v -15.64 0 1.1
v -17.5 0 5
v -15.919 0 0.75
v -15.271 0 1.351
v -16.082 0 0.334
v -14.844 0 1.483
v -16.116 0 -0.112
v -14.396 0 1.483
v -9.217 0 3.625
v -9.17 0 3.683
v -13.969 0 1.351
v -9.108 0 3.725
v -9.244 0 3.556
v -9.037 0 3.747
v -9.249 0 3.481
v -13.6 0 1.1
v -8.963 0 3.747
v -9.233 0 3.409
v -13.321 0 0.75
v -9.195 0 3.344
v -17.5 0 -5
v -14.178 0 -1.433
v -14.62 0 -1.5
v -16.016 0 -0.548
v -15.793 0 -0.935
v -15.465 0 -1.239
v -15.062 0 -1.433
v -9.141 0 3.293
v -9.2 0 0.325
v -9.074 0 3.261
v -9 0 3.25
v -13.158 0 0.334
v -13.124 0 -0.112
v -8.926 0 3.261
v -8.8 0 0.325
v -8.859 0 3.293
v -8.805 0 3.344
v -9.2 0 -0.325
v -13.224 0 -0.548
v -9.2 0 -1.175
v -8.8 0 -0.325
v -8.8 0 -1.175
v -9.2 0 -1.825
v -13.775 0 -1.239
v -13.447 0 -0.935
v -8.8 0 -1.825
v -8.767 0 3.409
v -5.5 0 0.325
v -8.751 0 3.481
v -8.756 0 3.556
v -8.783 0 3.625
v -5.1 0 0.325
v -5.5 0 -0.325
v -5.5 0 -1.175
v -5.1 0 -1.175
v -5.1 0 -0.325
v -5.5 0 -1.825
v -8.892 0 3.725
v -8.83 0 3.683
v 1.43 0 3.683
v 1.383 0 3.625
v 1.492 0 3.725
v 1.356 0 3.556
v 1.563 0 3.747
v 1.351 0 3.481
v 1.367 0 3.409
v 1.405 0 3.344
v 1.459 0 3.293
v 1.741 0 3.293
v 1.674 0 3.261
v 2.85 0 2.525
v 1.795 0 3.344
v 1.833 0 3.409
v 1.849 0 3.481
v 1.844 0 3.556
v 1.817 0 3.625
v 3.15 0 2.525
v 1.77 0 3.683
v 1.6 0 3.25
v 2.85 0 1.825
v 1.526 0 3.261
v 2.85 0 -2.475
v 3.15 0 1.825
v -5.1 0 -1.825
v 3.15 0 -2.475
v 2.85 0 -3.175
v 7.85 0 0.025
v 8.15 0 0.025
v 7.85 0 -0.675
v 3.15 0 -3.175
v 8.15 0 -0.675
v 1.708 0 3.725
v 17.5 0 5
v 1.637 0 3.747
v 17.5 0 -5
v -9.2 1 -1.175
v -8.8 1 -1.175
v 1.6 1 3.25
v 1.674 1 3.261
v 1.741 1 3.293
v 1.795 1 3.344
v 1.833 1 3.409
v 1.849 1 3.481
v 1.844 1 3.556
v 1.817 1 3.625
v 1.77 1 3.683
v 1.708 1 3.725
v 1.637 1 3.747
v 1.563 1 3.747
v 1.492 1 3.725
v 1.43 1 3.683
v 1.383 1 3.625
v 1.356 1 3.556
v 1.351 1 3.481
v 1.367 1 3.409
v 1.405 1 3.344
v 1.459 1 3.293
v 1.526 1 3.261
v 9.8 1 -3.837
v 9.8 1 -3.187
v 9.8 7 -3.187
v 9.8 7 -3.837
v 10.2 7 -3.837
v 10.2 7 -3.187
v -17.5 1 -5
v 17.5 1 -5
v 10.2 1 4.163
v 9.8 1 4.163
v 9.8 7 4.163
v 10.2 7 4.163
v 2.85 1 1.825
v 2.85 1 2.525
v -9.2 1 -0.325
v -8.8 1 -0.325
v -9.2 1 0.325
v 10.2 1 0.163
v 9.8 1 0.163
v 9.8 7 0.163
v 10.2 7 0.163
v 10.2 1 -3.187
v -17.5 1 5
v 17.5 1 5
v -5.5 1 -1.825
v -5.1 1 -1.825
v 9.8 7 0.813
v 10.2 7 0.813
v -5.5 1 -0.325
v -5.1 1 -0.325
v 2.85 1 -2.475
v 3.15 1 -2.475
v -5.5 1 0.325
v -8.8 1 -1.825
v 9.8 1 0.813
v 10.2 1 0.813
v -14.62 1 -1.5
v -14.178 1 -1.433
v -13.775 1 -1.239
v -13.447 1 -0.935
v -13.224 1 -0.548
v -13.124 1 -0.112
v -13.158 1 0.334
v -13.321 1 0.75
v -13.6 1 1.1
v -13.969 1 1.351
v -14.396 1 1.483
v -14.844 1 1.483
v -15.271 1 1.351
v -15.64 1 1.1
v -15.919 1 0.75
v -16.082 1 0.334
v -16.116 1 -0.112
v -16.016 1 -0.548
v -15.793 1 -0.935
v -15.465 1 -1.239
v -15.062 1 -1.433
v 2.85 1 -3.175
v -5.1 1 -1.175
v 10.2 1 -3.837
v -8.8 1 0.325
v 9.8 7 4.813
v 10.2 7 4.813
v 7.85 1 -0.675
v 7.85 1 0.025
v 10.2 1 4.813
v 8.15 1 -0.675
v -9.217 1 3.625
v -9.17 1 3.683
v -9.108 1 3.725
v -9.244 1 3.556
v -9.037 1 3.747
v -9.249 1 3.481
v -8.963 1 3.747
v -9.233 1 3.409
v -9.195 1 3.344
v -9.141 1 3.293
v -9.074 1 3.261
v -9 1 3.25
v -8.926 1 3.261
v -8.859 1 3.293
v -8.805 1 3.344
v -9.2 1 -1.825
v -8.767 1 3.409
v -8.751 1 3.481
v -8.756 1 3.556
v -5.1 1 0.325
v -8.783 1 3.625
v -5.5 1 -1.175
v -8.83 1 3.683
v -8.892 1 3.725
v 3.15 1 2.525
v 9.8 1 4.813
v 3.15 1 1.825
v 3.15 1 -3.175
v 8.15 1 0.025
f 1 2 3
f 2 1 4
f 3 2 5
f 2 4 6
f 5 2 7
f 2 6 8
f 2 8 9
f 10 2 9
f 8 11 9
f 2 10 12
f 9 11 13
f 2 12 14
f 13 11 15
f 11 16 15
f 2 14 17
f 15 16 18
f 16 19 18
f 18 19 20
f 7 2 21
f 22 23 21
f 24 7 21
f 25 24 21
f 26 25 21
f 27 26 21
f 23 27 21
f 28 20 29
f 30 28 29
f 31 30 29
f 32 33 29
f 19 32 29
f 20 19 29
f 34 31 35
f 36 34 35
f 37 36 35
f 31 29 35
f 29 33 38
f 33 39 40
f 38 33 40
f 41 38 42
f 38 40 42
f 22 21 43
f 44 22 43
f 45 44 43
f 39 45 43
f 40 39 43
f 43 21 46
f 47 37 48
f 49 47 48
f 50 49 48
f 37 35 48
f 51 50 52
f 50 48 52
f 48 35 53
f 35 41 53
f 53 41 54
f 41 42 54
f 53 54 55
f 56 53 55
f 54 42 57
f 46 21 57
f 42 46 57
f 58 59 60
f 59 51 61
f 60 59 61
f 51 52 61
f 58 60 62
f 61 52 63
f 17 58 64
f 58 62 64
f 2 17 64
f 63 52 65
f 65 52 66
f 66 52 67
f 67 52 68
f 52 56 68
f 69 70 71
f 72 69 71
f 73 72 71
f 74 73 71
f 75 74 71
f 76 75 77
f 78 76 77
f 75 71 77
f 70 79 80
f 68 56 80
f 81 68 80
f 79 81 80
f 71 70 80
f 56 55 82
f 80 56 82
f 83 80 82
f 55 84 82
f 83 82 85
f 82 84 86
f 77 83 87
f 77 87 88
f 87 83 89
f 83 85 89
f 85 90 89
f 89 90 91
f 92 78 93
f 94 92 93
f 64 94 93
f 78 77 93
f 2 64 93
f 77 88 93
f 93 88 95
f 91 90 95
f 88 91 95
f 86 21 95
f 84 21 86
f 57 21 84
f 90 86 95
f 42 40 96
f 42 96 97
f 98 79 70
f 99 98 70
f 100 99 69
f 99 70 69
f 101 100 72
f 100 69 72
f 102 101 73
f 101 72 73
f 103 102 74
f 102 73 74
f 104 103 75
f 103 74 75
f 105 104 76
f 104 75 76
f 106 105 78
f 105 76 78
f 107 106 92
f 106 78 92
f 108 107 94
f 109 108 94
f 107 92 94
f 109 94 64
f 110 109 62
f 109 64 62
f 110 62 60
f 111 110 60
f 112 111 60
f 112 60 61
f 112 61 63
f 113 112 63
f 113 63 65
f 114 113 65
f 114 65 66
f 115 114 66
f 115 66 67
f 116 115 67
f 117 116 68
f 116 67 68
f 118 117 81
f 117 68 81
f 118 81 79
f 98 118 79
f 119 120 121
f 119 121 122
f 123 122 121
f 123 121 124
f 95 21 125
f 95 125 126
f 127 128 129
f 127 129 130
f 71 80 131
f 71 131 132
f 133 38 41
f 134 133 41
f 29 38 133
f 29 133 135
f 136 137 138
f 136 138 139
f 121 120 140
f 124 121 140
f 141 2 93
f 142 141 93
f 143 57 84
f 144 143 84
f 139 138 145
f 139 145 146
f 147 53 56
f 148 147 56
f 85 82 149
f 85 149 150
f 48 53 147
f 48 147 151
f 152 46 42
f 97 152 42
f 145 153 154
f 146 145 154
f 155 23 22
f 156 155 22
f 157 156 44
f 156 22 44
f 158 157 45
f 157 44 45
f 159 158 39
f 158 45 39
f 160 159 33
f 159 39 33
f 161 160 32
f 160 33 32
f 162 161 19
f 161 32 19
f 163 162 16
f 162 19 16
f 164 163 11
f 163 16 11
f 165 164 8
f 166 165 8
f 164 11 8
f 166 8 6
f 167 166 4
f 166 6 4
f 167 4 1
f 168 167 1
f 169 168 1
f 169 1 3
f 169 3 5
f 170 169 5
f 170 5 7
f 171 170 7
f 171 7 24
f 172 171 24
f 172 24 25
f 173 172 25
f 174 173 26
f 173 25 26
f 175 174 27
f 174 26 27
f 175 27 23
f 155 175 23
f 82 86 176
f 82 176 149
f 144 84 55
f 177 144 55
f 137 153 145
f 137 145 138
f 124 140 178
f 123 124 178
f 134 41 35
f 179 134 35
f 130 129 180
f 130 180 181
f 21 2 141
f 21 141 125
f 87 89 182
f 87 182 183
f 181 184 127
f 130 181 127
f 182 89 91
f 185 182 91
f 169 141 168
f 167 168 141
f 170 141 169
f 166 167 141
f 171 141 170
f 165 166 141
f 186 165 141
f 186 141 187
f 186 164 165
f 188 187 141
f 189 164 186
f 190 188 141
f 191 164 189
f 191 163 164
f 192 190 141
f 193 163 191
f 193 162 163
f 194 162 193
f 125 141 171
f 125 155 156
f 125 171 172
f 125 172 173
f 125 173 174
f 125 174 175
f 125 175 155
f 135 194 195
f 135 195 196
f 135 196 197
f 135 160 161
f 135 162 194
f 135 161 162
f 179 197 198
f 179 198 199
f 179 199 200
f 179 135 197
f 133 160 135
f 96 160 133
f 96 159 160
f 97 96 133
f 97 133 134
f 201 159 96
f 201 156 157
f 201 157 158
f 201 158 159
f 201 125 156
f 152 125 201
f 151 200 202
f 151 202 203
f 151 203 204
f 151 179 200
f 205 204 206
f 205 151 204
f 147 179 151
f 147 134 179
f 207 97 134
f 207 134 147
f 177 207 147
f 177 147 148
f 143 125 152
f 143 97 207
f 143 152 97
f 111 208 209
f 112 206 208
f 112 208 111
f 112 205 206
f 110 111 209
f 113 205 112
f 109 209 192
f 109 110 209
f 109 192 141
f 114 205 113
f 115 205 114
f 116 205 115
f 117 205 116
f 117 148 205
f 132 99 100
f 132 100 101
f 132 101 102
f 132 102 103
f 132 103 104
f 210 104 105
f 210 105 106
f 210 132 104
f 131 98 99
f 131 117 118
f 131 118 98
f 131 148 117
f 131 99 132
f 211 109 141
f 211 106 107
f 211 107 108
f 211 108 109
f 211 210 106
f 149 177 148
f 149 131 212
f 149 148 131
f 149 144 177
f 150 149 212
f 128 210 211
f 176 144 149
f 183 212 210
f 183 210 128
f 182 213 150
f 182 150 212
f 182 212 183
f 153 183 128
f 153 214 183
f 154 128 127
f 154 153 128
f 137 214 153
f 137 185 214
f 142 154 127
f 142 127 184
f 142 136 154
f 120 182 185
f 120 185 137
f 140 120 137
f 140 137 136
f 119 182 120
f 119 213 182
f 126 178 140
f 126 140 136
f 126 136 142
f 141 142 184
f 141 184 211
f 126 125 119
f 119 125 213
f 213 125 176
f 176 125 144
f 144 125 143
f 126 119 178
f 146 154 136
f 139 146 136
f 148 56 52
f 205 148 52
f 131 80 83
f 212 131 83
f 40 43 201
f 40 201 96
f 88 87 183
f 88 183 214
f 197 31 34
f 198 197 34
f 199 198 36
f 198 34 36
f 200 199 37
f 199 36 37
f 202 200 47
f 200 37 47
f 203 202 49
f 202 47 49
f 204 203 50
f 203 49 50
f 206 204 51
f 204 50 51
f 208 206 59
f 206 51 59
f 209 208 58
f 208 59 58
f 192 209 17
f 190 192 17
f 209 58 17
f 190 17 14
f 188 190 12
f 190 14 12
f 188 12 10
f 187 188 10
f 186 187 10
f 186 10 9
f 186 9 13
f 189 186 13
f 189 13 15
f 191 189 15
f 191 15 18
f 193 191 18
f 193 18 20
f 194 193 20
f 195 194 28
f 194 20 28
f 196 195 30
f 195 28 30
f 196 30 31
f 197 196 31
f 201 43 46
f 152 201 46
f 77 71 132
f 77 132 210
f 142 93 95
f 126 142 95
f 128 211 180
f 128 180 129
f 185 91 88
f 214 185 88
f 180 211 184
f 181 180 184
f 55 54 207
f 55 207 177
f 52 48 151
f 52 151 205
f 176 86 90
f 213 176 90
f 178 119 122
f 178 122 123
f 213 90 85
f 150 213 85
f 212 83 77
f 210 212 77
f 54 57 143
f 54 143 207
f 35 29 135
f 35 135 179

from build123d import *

# Parameters (mm, degrees)
SKETCH1_W           = 35
SKETCH1_H           = 10
BOSS_EXTRUDE1_DEPTH = 1
SKETCH2_R           = 0.25
SKETCH2_R_2         = 1.5
SKETCH2_W           = 0.4
SKETCH2_H           = 0.65
SKETCH2_W_2         = 0.3
SKETCH2_H_2         = 0.7
CUT_EXTRUDE1_DEPTH  = 1
SKETCH3_W           = 0.4
SKETCH3_H           = 0.65
BOSS_EXTRUDE2_DEPTH = 6


with BuildPart() as part:
    # Sketch1 → Boss-Extrude1 (new body)
    with BuildSketch(Plane(origin=(0, 0, 0), x_dir=(1, 0, 0), z_dir=(0, 1, 0))):
        Rectangle(SKETCH1_W, SKETCH1_H)
    extrude(amount=BOSS_EXTRUDE1_DEPTH)

    # Sketch2 → Cut-Extrude1 (cut)
    with BuildSketch(Plane.XZ):
        with Locations(Location((-9, 3.5, 0), (0, 0, 270))):
            Circle(SKETCH2_R)
        with Locations(Location((1.6, 3.5, 0), (0, 0, 270))):
            Circle(SKETCH2_R)
        with Locations(Location((-14.620013046, 0, 0), (0, 0, 270))):
            Circle(SKETCH2_R_2)
        with Locations((-9, 0)):
            Rectangle(SKETCH2_W, SKETCH2_H)
        with Locations((-9, -1.5)):
            Rectangle(SKETCH2_W, SKETCH2_H)
        with Locations((-5.3, 0)):
            Rectangle(SKETCH2_W, SKETCH2_H)
        with Locations((-5.3, -1.5)):
            Rectangle(SKETCH2_W, SKETCH2_H)
        with Locations((8, -0.325)):
            Rectangle(SKETCH2_W_2, SKETCH2_H_2)
        with Locations((3, 2.175)):
            Rectangle(SKETCH2_W_2, SKETCH2_H_2)
        with Locations((3, -2.825)):
            Rectangle(SKETCH2_W_2, SKETCH2_H_2)
    extrude(amount=-CUT_EXTRUDE1_DEPTH, mode=Mode.SUBTRACT)

    # Sketch3 → Boss-Extrude2 (add)
    with BuildSketch(Plane(origin=(0, 1, 0), x_dir=(1, 0, 0), z_dir=(0, 1, 0))):
        with Locations((10, -0.487564974)):
            Rectangle(SKETCH3_W, SKETCH3_H)
        with Locations((10, 3.512435026)):
            Rectangle(SKETCH3_W, SKETCH3_H)
        with Locations((10, -4.487564974)):
            Rectangle(SKETCH3_W, SKETCH3_H)
    extrude(amount=BOSS_EXTRUDE2_DEPTH)


solid = part.part
